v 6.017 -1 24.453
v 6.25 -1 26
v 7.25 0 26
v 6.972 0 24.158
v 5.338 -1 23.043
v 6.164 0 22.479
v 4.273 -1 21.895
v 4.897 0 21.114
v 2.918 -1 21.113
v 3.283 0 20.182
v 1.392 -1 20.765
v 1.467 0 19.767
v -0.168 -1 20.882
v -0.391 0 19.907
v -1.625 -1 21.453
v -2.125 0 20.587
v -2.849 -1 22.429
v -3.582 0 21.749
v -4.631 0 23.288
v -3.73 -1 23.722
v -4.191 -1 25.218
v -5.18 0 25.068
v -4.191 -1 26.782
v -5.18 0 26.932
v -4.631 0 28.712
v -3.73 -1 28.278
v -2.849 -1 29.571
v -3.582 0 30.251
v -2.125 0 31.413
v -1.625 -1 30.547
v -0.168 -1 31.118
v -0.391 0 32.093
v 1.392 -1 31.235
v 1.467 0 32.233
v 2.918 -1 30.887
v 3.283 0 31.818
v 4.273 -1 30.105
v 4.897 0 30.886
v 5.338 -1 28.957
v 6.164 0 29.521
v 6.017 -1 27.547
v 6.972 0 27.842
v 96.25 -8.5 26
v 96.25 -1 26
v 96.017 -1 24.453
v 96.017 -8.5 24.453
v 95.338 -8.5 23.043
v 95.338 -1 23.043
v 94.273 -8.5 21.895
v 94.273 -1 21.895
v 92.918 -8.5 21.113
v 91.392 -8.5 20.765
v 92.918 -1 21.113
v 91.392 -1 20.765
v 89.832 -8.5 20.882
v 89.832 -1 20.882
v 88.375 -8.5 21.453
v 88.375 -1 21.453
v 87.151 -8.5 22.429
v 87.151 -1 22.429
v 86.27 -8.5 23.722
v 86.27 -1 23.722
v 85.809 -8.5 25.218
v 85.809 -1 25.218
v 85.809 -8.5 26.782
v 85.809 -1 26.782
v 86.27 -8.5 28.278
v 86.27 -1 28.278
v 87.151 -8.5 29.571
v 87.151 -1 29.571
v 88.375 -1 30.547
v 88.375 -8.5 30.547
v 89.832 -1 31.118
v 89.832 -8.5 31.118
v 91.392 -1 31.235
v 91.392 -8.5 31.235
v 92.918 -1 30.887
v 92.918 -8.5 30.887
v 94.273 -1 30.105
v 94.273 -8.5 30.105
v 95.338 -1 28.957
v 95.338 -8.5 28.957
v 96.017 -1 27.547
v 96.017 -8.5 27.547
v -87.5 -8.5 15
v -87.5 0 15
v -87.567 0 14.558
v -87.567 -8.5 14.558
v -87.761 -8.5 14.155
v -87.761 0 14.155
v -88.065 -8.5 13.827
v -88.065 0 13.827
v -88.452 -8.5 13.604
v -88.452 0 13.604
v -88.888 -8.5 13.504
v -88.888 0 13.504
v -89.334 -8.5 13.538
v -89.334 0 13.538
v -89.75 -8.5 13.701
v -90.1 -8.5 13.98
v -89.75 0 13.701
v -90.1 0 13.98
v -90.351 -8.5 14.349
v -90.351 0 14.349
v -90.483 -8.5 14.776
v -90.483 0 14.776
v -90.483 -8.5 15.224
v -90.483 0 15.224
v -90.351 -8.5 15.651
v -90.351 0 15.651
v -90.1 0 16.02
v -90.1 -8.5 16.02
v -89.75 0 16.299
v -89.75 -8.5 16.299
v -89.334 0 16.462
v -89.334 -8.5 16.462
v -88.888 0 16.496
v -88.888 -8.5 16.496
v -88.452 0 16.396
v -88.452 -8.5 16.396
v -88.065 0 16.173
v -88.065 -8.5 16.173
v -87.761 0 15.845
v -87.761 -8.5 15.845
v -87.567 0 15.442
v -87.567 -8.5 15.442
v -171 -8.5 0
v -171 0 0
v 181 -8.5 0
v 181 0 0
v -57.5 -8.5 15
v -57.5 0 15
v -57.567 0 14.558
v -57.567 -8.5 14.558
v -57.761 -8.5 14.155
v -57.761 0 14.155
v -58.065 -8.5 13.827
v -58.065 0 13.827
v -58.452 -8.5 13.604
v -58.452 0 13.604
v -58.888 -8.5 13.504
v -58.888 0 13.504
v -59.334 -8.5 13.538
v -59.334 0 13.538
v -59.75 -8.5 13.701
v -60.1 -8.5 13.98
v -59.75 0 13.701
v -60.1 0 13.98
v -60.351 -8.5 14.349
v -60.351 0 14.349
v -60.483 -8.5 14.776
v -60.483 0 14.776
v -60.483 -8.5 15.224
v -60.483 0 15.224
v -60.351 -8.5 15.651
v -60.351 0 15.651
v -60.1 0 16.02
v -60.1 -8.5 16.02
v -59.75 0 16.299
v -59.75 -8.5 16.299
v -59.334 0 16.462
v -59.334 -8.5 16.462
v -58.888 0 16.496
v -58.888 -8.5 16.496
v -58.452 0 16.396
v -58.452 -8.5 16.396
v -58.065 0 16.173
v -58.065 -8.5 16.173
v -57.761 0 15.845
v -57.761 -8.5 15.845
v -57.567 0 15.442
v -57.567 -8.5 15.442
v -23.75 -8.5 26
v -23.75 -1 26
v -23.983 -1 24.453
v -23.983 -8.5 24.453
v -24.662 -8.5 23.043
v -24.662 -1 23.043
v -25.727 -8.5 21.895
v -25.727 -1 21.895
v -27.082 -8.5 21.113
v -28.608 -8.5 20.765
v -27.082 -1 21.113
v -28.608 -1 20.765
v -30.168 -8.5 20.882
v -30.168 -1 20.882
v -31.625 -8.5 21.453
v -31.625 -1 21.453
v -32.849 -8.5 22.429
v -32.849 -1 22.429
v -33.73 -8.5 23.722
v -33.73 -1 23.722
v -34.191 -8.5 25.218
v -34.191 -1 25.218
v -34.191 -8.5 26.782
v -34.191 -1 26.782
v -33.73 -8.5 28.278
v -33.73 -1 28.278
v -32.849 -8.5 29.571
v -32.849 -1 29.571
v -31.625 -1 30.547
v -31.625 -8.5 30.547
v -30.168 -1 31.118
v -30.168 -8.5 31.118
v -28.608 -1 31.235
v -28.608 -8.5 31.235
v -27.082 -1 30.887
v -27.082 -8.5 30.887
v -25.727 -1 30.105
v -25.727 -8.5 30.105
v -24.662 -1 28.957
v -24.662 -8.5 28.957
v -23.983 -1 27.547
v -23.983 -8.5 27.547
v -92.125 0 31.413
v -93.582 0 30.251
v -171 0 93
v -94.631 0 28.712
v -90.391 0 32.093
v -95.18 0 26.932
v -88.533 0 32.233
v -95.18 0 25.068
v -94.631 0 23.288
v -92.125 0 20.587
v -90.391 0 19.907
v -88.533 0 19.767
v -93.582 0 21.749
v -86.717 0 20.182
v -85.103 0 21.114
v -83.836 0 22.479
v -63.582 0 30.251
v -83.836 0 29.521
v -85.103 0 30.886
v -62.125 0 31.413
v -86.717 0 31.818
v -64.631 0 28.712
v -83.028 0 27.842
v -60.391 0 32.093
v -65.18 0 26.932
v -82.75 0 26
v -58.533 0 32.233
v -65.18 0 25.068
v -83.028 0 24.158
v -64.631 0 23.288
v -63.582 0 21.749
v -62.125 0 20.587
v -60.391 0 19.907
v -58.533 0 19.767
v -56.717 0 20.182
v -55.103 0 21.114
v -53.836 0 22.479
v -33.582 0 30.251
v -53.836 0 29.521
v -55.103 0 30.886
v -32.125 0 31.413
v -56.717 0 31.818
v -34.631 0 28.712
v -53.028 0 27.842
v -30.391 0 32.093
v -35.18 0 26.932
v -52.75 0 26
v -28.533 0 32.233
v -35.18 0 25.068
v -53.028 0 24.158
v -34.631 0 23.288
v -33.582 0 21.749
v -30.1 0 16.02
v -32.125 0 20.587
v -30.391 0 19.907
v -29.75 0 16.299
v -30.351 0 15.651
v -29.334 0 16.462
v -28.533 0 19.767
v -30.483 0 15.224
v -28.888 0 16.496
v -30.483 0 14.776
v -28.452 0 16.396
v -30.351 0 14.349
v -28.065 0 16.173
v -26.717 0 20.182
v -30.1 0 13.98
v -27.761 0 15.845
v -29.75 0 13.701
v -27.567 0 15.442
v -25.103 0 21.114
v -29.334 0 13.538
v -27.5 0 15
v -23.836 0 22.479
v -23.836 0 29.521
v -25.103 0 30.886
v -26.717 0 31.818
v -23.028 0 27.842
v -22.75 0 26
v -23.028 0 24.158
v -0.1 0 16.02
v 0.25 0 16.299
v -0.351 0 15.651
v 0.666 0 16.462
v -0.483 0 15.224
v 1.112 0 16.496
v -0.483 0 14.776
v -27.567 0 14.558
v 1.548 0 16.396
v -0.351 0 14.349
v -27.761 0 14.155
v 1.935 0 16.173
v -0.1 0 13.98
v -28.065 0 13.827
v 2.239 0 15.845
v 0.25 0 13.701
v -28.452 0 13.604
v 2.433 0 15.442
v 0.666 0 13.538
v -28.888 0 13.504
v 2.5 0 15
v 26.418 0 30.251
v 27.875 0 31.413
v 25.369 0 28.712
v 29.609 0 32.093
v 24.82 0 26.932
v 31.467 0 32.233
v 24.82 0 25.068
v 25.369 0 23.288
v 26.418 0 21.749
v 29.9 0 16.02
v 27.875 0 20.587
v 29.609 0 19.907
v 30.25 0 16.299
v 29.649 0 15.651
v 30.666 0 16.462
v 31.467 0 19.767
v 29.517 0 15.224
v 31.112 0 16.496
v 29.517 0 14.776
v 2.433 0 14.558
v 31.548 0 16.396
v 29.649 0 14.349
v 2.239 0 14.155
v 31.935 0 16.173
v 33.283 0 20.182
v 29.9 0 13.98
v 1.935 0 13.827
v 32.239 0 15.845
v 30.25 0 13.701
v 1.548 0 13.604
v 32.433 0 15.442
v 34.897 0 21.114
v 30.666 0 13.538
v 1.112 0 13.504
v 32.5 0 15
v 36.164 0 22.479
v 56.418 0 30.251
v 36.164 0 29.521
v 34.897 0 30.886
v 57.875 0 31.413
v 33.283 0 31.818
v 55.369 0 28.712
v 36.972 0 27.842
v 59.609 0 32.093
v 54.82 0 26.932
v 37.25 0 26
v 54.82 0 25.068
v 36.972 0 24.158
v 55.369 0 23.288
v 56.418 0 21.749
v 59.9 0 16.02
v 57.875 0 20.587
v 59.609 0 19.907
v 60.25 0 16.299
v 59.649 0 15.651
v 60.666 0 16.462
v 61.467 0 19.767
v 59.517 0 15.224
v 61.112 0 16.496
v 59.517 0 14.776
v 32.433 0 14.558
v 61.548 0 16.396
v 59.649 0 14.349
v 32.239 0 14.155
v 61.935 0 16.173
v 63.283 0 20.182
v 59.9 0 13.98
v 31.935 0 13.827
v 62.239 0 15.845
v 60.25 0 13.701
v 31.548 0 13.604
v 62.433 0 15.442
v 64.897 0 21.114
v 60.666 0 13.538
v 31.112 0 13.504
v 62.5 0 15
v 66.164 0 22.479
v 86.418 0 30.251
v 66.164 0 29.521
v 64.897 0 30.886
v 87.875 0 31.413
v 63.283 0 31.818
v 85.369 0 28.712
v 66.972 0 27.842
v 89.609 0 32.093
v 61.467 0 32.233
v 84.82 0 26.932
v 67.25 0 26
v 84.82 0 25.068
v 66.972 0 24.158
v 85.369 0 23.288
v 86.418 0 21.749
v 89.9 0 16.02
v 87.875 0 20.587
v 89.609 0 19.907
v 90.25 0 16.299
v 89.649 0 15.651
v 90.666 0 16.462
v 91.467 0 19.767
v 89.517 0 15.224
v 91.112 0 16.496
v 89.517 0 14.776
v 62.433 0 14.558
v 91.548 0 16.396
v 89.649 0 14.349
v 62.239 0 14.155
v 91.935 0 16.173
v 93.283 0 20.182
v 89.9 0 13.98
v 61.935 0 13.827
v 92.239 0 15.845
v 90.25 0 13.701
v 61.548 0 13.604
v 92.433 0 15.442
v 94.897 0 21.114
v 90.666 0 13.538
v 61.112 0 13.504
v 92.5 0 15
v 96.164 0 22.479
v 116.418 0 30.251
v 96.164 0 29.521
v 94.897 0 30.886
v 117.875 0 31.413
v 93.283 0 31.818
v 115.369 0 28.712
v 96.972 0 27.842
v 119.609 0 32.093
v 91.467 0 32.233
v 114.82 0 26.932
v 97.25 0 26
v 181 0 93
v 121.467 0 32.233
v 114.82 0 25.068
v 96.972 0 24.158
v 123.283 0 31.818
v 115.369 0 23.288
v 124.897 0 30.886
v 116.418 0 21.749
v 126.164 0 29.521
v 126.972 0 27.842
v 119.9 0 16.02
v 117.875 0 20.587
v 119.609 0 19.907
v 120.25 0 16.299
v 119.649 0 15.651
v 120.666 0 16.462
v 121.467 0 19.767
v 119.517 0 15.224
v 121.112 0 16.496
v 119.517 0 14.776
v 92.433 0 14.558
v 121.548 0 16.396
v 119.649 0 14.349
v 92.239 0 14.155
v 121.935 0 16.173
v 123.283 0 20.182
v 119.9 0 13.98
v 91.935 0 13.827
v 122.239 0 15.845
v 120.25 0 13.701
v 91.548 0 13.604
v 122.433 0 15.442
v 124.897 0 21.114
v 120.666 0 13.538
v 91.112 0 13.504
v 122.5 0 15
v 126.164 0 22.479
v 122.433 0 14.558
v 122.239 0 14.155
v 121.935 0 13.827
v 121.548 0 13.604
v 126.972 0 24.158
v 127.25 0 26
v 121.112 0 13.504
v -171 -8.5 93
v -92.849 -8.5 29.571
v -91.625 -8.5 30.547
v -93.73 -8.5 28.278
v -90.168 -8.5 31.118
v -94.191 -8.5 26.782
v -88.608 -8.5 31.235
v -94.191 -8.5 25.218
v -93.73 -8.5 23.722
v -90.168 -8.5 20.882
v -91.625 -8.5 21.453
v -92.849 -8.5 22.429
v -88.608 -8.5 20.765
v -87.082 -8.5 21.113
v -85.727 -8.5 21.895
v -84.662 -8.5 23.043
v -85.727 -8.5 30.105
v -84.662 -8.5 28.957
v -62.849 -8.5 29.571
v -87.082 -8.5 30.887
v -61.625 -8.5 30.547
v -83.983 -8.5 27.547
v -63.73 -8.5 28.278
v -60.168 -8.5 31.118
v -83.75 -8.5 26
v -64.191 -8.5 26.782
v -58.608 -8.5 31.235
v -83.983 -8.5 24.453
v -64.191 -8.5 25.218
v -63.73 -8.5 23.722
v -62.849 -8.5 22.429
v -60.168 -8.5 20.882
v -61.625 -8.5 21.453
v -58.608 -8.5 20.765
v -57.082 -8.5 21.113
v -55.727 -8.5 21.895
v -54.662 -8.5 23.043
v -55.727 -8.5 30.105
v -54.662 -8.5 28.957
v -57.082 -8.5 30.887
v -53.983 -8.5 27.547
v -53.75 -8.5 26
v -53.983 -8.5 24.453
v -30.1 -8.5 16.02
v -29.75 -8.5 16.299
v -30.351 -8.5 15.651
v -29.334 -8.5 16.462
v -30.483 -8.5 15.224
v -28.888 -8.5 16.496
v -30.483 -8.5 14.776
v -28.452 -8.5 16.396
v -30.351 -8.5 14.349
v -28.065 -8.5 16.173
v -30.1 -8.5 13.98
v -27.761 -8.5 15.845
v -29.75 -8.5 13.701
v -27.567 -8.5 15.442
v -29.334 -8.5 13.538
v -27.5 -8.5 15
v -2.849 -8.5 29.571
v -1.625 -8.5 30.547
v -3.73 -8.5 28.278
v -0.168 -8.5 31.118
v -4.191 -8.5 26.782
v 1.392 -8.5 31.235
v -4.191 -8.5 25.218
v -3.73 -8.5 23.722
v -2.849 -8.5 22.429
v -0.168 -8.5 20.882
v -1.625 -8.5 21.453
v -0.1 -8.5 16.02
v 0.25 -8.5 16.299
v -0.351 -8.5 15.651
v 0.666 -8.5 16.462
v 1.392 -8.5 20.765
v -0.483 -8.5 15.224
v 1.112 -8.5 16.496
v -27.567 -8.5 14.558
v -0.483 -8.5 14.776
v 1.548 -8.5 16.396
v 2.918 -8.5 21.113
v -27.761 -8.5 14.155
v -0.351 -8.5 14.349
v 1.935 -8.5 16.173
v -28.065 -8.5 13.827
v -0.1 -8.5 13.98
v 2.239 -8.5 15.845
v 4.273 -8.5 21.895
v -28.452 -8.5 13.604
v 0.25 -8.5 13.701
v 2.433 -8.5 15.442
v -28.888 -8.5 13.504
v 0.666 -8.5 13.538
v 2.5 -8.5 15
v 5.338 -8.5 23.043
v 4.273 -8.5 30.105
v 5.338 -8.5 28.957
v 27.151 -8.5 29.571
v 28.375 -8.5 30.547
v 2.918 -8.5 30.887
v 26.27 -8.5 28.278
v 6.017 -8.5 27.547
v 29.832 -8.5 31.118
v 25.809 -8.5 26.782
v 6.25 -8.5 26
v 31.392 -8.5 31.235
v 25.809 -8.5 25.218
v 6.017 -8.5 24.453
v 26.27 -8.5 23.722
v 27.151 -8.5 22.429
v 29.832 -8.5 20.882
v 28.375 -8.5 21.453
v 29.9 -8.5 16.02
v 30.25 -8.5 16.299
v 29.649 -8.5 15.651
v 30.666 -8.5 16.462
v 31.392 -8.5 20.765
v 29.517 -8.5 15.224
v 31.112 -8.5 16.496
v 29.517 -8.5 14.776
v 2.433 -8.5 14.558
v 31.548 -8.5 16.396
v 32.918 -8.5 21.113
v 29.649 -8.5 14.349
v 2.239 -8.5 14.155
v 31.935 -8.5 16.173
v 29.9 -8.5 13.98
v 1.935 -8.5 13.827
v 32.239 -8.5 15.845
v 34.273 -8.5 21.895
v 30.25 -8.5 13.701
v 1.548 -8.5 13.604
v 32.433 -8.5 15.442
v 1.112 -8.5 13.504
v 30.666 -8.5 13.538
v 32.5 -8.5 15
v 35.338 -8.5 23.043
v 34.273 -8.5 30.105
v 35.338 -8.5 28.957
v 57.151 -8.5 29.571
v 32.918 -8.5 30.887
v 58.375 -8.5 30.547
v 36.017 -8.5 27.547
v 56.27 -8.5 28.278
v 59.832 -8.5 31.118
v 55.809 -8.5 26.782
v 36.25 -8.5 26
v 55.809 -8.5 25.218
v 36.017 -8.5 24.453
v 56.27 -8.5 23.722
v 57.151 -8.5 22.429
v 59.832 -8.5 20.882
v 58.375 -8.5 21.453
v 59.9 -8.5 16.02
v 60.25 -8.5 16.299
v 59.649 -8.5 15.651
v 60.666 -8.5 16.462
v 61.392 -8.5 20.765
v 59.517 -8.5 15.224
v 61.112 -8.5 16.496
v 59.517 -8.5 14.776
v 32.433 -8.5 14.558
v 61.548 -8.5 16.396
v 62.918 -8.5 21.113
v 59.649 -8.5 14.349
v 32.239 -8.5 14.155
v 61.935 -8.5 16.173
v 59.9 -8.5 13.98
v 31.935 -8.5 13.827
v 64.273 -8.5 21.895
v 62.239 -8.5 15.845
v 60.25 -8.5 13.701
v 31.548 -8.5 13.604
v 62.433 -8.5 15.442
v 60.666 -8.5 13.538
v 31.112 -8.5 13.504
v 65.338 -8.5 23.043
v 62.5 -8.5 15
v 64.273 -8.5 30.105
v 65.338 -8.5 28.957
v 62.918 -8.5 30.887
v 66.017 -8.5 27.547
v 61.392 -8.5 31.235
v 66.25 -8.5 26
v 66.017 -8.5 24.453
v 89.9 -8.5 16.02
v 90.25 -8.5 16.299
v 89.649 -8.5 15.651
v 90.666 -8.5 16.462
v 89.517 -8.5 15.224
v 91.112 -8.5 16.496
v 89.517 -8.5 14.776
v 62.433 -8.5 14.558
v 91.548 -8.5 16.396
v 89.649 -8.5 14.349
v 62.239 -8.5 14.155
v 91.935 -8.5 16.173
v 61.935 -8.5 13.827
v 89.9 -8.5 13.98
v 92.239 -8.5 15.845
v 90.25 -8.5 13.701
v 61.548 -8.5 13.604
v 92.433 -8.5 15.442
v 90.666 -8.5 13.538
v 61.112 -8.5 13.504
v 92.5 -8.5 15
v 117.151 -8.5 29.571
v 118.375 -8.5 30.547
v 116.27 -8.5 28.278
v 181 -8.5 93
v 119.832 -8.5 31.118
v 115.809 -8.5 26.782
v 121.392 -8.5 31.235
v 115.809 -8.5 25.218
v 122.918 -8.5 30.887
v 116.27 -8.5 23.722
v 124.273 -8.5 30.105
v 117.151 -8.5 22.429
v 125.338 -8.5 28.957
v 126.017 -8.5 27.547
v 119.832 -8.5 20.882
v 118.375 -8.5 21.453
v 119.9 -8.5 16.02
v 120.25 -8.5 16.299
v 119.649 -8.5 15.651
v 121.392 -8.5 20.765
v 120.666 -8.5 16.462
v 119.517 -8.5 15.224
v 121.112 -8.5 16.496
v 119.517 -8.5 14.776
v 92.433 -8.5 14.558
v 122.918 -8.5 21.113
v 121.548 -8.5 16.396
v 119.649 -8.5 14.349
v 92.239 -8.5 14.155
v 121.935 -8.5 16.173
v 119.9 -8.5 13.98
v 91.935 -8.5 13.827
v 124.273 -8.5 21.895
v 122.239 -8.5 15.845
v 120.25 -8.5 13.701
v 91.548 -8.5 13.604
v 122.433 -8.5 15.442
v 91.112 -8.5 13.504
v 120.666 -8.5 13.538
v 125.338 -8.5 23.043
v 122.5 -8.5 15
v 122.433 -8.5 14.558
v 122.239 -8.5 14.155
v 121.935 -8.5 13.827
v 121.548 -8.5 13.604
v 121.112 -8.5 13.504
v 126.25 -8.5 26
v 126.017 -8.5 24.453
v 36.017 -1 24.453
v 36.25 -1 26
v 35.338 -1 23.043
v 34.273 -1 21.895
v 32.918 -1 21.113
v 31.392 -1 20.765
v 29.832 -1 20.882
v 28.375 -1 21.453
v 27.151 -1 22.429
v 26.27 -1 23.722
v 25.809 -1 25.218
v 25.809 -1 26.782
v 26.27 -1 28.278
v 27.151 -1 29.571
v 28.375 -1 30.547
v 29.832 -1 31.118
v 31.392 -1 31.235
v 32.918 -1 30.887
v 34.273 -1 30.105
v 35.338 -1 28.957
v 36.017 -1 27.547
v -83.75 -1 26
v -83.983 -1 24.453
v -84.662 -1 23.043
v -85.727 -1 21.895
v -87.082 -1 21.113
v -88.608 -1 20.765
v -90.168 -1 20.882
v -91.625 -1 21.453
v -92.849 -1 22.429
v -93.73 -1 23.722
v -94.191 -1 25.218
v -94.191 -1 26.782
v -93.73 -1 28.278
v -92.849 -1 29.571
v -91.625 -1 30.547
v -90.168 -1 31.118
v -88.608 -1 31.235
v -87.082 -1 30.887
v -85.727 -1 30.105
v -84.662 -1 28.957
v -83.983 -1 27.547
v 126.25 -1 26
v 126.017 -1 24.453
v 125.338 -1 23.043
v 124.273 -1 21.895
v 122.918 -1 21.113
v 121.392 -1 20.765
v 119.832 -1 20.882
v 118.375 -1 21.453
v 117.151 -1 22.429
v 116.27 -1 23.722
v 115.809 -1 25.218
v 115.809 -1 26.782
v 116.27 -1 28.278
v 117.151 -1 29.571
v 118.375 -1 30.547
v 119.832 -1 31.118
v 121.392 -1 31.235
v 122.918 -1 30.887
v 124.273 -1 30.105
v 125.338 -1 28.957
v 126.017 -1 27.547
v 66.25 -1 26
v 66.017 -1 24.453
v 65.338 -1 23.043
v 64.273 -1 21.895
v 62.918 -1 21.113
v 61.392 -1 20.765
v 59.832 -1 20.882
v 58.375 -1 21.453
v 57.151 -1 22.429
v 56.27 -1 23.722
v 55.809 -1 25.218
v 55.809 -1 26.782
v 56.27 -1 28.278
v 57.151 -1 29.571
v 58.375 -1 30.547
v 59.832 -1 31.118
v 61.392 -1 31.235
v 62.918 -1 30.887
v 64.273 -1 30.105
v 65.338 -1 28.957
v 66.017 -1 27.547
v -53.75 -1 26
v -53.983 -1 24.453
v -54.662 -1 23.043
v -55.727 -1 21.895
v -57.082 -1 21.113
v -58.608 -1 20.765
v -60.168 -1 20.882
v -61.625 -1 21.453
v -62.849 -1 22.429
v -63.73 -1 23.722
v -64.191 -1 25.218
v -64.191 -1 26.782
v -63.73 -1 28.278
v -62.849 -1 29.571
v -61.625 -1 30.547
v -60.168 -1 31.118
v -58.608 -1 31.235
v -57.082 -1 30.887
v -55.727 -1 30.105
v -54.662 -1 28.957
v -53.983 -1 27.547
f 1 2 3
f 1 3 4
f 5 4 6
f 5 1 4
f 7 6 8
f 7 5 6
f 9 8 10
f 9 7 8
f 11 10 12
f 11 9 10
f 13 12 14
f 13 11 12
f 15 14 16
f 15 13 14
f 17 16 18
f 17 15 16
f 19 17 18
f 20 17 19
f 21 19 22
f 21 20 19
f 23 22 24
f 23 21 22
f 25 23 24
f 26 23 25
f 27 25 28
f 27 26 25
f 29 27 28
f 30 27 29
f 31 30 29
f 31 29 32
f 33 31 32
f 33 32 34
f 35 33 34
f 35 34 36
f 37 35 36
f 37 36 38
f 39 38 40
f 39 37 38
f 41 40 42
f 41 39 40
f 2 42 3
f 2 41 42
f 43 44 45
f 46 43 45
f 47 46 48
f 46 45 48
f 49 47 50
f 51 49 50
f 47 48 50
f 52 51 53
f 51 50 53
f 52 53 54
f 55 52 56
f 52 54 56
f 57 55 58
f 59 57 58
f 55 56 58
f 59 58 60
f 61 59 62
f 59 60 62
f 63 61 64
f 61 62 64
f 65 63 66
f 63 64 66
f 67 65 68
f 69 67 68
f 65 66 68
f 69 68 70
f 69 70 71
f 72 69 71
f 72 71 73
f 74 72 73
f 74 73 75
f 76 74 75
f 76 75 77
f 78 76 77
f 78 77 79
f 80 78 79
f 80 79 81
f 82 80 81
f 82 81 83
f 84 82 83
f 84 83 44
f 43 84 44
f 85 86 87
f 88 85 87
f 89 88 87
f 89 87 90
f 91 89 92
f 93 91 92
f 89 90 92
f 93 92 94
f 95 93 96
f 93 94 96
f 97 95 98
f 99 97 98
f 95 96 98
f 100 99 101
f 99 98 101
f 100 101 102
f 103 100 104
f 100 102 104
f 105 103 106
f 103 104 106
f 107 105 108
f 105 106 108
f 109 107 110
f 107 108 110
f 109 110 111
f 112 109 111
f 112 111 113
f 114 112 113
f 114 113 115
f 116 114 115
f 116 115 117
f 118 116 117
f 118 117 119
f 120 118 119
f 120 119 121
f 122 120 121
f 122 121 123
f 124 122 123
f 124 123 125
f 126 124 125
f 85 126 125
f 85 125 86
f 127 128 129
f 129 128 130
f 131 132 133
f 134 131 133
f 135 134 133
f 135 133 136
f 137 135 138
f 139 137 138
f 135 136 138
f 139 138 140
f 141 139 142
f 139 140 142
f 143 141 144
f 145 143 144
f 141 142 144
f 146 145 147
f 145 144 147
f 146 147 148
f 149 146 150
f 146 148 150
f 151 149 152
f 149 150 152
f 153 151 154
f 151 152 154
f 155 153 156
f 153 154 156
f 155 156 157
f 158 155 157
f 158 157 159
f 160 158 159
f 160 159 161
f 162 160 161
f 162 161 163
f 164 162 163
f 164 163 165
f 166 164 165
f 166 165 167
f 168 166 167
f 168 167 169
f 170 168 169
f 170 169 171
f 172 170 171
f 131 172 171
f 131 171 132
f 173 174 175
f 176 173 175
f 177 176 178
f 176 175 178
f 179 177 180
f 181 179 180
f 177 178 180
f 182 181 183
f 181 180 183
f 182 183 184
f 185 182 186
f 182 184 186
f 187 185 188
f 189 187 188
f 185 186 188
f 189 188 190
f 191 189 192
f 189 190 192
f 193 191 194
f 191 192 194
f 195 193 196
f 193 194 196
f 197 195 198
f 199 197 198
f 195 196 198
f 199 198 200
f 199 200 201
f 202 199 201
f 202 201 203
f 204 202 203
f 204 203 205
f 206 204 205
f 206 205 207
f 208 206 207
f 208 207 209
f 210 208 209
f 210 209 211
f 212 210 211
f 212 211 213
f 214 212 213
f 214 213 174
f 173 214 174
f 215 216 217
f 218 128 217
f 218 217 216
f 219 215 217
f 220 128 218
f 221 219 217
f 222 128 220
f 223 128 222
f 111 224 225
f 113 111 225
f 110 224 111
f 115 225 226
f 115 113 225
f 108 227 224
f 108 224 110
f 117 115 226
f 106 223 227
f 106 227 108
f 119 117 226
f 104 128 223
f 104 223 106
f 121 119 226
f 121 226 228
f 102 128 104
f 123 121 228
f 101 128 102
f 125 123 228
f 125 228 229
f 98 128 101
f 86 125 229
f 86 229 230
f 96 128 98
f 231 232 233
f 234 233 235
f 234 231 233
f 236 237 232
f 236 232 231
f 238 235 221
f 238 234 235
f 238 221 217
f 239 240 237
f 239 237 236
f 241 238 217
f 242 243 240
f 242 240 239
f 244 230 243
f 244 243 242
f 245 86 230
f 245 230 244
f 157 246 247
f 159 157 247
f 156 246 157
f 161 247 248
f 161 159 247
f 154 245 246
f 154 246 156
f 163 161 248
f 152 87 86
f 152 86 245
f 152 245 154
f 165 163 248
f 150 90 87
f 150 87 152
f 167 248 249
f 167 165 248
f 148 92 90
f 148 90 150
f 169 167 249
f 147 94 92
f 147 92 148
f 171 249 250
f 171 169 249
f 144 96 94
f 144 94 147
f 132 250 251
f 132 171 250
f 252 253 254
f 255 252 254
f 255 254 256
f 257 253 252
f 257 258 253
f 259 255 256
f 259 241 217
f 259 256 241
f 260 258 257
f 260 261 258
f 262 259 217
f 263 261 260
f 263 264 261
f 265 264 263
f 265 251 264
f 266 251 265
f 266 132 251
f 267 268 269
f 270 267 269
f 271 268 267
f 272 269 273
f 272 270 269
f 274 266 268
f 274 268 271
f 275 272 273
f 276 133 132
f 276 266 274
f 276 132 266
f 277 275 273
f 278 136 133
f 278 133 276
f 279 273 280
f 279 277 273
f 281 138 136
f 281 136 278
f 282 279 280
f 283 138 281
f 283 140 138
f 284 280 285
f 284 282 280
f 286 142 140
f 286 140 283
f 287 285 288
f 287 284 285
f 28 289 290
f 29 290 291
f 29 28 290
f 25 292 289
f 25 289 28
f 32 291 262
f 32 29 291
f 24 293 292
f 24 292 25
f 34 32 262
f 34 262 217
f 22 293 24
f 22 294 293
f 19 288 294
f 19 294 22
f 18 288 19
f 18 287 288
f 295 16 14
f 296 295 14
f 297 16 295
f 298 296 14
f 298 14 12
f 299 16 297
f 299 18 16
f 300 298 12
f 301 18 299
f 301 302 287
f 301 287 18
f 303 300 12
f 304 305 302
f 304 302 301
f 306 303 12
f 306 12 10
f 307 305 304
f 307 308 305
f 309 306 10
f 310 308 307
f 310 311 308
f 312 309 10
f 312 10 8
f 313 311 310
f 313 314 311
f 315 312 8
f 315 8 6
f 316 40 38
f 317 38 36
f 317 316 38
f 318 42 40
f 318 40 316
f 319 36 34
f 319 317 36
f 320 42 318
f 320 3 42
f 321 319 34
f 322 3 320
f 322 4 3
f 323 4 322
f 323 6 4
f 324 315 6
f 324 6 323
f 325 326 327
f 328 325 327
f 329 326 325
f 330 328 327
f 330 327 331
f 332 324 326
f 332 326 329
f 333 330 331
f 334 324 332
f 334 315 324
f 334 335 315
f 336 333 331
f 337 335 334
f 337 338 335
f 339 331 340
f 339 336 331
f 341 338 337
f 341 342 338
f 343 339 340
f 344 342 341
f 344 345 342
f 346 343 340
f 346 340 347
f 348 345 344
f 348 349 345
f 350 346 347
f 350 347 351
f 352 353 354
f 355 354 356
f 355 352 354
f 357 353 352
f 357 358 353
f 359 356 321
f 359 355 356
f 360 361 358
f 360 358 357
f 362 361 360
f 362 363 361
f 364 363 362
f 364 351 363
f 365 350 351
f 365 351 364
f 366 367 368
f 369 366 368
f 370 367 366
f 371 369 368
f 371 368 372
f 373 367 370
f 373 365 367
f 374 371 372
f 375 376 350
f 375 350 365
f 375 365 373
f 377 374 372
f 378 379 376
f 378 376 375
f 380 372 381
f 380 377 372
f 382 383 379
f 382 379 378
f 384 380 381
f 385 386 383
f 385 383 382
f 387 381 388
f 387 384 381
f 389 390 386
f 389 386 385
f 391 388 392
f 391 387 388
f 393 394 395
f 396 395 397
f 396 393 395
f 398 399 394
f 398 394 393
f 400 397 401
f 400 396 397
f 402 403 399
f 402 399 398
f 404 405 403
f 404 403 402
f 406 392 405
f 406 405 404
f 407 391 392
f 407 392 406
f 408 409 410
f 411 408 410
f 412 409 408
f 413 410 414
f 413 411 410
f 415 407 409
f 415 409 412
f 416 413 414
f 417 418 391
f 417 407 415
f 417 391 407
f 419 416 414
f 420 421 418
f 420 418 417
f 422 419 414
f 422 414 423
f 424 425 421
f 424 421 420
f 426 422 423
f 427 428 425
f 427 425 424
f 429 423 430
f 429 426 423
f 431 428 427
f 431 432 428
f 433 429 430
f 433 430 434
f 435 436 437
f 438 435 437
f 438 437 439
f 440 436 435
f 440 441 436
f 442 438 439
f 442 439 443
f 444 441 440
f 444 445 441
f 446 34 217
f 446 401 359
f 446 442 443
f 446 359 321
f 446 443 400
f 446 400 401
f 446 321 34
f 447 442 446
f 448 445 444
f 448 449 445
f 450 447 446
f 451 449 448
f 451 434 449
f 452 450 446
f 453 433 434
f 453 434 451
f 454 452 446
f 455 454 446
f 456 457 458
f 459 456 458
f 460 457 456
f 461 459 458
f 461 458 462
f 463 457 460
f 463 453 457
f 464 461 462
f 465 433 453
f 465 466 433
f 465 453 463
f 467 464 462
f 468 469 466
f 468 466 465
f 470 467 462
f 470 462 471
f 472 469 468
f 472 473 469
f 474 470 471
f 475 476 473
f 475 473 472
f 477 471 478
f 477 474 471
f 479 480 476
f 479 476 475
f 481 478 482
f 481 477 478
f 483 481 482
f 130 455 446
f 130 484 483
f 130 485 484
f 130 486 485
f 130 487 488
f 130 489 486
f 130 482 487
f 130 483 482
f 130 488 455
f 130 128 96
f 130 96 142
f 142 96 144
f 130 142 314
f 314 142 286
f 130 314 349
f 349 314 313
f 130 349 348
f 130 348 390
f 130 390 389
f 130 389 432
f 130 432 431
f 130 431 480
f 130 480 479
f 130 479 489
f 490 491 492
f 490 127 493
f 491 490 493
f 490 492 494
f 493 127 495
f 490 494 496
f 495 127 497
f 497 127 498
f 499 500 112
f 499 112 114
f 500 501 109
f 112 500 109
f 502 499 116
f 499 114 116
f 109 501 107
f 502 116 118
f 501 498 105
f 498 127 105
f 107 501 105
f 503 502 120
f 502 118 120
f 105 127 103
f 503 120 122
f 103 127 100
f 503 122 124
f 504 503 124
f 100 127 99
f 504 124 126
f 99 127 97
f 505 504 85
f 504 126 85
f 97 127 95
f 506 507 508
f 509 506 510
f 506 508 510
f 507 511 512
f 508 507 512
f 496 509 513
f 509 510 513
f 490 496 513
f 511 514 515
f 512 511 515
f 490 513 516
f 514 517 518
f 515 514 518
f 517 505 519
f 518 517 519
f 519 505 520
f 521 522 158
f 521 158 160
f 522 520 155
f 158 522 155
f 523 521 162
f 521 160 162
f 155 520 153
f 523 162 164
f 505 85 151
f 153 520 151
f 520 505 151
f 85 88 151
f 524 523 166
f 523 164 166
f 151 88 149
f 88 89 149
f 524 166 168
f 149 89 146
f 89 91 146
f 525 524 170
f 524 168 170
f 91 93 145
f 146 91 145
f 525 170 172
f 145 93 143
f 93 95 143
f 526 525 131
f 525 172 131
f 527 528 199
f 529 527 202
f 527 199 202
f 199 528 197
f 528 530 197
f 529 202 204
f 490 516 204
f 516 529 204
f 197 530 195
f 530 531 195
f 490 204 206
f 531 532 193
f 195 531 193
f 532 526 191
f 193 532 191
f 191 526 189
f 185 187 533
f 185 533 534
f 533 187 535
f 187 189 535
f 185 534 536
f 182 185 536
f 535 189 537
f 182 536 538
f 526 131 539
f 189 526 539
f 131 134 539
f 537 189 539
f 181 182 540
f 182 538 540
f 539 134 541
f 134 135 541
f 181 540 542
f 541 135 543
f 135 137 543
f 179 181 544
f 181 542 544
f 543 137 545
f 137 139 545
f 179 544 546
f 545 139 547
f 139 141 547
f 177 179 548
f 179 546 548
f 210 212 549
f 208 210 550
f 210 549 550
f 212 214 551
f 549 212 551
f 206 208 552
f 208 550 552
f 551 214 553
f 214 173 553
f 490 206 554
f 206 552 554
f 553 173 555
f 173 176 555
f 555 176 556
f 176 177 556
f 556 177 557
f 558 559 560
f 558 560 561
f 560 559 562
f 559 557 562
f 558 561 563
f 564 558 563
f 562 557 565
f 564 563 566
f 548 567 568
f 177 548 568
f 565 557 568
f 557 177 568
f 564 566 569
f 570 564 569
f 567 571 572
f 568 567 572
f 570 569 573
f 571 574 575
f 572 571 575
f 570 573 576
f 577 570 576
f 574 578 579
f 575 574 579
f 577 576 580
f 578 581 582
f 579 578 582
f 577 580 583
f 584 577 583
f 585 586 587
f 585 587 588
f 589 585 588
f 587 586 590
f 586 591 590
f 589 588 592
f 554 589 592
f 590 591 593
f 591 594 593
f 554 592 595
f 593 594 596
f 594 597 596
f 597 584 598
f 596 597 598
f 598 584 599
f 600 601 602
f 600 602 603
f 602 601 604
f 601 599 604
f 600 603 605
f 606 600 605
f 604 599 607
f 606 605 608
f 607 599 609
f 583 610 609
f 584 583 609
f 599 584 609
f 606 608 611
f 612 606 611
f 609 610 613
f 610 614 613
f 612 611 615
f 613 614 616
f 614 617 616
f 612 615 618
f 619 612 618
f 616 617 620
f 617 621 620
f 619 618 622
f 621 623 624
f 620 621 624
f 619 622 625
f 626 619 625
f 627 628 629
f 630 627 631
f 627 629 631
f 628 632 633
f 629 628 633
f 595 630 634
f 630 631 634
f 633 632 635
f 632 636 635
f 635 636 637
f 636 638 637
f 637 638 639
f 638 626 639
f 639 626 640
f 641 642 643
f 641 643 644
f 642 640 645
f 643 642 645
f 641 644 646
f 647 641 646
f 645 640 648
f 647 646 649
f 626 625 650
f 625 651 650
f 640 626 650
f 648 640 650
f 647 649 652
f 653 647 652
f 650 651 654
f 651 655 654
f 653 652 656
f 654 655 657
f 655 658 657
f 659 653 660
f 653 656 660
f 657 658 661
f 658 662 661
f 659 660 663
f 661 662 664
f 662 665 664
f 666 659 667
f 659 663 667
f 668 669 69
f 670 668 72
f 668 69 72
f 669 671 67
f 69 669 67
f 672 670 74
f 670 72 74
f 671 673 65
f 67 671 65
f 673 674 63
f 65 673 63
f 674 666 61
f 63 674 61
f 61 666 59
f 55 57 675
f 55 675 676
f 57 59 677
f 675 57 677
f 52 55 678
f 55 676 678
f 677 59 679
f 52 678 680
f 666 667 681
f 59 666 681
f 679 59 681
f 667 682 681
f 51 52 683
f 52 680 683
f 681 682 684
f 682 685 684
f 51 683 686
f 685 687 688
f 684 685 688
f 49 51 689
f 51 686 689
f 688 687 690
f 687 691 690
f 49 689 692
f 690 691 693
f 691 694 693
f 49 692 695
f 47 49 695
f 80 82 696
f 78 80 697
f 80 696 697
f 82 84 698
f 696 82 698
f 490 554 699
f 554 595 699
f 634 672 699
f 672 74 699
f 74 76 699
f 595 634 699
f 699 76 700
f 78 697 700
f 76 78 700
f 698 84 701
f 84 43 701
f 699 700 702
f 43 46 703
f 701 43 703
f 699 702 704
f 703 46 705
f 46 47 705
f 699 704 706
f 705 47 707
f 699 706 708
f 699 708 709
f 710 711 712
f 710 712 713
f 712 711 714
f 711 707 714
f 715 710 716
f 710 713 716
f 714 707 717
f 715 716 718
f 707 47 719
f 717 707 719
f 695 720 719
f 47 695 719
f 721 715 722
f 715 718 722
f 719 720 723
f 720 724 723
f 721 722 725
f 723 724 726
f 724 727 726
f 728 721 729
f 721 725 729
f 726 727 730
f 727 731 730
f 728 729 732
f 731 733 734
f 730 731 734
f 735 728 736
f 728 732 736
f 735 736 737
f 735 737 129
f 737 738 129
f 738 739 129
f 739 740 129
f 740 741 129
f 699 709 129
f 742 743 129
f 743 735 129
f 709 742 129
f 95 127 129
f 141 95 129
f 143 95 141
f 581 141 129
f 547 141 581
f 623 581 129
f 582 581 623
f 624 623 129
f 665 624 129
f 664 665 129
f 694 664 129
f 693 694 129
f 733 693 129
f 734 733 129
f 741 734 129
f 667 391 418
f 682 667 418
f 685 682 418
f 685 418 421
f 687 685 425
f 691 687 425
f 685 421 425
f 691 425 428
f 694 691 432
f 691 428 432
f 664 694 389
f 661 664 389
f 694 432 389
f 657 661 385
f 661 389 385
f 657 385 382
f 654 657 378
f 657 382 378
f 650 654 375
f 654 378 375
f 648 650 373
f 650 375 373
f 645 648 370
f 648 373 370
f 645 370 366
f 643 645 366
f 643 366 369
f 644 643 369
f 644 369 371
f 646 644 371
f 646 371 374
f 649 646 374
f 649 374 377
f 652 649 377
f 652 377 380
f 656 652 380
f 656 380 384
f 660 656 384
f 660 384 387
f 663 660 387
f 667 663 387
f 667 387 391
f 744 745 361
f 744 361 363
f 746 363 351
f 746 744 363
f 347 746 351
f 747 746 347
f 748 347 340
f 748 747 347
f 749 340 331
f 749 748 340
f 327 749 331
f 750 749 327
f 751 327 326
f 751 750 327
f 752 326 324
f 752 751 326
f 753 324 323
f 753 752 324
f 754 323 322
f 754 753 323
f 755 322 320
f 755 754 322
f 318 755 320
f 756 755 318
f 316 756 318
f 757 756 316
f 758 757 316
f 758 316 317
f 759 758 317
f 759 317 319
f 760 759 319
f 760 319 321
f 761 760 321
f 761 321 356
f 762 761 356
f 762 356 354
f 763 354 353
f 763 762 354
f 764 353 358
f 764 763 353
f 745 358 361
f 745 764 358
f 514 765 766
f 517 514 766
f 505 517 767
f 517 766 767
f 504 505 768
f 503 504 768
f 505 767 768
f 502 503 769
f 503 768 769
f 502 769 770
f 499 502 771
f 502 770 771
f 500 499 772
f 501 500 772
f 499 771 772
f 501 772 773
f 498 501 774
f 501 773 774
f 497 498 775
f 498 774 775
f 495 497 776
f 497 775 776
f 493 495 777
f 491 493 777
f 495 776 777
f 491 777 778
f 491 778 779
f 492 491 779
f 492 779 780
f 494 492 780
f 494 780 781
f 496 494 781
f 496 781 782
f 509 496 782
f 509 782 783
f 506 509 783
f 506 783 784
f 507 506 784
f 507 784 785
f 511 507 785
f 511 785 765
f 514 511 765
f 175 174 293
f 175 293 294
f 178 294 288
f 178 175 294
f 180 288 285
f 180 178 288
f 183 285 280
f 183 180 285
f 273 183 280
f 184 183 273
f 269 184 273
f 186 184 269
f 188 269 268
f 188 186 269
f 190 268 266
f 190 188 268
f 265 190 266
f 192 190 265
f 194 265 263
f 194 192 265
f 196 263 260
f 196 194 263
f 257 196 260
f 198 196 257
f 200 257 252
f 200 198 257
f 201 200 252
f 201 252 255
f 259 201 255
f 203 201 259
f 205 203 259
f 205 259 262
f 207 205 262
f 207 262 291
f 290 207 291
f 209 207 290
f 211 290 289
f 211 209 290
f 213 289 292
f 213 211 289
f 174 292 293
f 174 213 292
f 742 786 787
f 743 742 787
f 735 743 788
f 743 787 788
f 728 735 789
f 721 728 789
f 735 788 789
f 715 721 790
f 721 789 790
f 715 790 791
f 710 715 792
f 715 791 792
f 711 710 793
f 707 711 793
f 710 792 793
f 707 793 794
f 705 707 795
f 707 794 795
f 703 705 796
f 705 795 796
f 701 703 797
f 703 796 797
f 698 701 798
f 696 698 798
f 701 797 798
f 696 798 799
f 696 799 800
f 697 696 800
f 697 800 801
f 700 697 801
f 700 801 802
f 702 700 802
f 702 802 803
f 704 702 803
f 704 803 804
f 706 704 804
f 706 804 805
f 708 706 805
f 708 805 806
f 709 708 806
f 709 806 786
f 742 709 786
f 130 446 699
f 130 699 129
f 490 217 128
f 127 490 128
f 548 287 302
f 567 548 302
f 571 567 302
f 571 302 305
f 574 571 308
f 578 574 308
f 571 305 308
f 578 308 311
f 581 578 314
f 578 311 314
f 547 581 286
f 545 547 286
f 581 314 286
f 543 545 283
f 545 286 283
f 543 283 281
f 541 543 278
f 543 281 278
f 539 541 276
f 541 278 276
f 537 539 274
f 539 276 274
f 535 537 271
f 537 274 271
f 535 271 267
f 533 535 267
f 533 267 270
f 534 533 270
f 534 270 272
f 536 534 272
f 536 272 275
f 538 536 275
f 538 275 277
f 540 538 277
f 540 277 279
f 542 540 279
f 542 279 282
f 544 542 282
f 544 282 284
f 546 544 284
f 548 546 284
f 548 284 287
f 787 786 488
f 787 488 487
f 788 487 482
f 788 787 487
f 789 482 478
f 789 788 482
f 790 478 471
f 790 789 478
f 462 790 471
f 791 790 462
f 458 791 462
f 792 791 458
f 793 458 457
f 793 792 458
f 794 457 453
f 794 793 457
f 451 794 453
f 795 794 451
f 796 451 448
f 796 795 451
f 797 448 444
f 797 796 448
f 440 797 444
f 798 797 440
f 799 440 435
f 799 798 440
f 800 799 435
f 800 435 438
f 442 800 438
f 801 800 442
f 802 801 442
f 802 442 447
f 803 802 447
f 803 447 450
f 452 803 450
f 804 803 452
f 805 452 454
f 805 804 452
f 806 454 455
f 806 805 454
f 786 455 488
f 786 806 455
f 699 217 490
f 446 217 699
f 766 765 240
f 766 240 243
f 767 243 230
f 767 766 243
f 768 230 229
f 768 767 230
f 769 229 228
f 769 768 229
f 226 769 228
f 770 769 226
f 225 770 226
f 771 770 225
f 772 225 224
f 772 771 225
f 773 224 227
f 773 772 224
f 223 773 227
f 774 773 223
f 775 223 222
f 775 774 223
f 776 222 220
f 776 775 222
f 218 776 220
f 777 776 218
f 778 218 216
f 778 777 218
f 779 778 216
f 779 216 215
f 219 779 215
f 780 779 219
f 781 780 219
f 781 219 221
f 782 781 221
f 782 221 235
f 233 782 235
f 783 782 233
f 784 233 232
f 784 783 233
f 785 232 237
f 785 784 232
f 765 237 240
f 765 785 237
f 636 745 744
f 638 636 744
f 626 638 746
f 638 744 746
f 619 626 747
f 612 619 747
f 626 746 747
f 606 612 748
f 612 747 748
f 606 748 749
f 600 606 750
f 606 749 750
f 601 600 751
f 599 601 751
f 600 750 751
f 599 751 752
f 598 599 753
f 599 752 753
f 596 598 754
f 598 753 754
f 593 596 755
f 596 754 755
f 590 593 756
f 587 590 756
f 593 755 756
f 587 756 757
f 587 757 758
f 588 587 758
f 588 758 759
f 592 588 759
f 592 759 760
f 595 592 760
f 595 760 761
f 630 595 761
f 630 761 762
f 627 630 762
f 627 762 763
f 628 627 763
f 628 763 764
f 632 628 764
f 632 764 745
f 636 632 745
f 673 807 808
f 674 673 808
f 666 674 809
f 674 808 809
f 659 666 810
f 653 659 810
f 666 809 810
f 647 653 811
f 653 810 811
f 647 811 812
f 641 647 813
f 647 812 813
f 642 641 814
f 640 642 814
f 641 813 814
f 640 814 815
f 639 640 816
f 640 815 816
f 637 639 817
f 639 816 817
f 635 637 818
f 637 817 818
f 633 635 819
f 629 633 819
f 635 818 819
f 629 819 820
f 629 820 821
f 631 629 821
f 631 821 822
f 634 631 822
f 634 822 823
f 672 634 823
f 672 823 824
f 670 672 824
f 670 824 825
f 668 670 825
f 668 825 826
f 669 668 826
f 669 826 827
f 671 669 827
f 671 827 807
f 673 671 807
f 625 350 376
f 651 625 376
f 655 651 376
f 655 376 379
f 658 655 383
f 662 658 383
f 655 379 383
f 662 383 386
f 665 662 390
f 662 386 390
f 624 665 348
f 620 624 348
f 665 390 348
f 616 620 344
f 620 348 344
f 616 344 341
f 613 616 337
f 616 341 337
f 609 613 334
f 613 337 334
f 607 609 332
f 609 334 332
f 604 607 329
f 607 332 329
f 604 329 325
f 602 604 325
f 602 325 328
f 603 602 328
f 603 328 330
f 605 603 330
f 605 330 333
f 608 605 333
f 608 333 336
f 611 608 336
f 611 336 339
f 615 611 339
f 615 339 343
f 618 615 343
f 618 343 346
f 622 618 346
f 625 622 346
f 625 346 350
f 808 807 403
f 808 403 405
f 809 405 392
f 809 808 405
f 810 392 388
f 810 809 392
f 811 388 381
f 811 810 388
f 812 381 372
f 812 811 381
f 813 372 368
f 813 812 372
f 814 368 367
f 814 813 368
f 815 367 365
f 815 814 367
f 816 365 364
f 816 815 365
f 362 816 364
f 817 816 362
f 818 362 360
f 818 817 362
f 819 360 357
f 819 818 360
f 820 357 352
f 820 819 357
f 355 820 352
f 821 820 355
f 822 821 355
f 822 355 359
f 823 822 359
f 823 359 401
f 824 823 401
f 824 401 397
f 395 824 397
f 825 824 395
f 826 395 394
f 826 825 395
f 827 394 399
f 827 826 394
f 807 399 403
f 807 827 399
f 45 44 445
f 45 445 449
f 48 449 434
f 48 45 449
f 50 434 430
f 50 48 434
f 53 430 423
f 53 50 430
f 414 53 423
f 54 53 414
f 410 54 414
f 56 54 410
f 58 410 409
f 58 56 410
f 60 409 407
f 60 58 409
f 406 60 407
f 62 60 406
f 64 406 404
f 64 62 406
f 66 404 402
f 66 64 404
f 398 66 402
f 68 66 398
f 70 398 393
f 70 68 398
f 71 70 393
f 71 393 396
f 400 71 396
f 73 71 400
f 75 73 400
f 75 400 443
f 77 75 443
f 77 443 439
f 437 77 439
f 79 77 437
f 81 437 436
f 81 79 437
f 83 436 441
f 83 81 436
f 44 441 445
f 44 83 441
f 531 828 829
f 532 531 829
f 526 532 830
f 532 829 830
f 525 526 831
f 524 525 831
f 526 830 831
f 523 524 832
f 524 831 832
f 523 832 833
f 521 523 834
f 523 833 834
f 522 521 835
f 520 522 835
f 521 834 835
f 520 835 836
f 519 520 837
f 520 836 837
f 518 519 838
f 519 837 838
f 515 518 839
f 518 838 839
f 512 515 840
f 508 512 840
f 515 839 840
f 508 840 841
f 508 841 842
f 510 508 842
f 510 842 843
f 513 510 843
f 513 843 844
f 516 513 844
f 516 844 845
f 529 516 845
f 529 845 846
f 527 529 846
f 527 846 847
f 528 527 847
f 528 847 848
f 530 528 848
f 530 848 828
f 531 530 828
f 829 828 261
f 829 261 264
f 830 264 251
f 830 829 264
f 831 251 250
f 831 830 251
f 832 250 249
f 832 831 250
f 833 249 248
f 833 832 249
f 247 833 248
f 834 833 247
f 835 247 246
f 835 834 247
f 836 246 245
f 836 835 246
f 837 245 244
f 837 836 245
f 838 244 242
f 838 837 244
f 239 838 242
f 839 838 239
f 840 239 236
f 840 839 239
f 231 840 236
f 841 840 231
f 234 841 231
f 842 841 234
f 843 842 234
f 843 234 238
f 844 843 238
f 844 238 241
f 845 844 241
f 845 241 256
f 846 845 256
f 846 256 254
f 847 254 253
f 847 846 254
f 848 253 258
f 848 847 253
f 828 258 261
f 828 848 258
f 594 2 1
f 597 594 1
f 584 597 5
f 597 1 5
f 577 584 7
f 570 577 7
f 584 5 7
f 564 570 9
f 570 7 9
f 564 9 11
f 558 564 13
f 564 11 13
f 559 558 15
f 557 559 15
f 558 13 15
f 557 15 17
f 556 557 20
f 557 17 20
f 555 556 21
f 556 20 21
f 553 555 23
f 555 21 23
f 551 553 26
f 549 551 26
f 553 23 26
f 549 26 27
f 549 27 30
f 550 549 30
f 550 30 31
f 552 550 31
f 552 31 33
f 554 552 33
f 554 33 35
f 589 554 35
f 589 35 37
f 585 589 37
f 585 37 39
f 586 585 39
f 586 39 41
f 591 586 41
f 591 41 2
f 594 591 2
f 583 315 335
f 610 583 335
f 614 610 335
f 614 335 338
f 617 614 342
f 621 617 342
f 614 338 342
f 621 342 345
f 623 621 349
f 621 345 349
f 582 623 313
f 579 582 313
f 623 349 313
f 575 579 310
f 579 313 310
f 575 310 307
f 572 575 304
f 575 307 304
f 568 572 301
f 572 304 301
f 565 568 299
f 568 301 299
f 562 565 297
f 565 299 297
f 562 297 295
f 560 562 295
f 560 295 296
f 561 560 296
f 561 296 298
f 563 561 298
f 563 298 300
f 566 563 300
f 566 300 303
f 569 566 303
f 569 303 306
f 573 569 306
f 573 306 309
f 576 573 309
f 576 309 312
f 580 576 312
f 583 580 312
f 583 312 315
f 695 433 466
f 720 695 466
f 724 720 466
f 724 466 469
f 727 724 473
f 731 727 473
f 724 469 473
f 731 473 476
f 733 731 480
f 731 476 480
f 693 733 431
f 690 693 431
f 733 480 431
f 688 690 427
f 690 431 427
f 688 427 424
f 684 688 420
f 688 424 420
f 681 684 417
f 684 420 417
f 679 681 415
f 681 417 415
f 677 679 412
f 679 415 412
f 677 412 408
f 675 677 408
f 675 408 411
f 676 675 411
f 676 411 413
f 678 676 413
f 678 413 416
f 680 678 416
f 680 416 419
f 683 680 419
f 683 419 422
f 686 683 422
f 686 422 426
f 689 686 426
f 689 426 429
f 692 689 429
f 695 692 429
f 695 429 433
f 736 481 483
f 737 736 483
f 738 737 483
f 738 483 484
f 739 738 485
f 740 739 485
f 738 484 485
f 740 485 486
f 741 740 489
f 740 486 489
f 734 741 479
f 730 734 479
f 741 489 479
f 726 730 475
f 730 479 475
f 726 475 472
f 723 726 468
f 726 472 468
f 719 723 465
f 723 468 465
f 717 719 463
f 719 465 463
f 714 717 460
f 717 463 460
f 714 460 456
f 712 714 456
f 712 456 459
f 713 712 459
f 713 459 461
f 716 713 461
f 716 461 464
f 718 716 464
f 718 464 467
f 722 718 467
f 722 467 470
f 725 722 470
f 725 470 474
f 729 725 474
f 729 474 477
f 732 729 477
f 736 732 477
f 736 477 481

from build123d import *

# Parameters (mm, degrees)
ESQUISSE5_W             = 352
ESQUISSE5_H             = 93
BOSS_EXTRU_2_DEPTH      = 8.5
ESQUISSE3_R             = 1.5
ESQUISSE3_R_2           = 5.25
ENL_V_MAT_EXTRU_1_DEPTH = 9.5
CHANFREIN1_SIZE         = 1


with BuildPart() as part:
    # Esquisse5 → Boss.-Extru.2 (new body)
    with BuildSketch(Plane(origin=(0, 0, 0), x_dir=(1, 0, 0), z_dir=(0, 1, 0))):
        with Locations((5, -46.5)):
            Rectangle(ESQUISSE5_W, ESQUISSE5_H)
    extrude(amount=-BOSS_EXTRU_2_DEPTH)

    # Esquisse3 → Enlèv. mat.-Extru.1 (cut, through all)
    with BuildSketch(Plane(origin=(0, 0, 0), x_dir=(1, 0, 0), z_dir=(0, 1, 0))):
        with Locations((-89, -15)):
            Circle(ESQUISSE3_R)
        with Locations((-89, -26)):
            Circle(ESQUISSE3_R_2)
        with Locations((-59, -15)):
            Circle(ESQUISSE3_R)
        with Locations((-59, -26)):
            Circle(ESQUISSE3_R_2)
        with Locations((-29, -15)):
            Circle(ESQUISSE3_R)
        with Locations((-29, -26)):
            Circle(ESQUISSE3_R_2)
        with Locations((1, -15)):
            Circle(ESQUISSE3_R)
        with Locations((1, -26)):
            Circle(ESQUISSE3_R_2)
        with Locations((31, -15)):
            Circle(ESQUISSE3_R)
        with Locations((31, -26)):
            Circle(ESQUISSE3_R_2)
        with Locations((61, -15)):
            Circle(ESQUISSE3_R)
        with Locations((61, -26)):
            Circle(ESQUISSE3_R_2)
        with Locations((91, -15)):
            Circle(ESQUISSE3_R)
        with Locations((91, -26)):
            Circle(ESQUISSE3_R_2)
        with Locations((121, -15)):
            Circle(ESQUISSE3_R)
        with Locations((121, -26)):
            Circle(ESQUISSE3_R_2)
    extrude(amount=-ENL_V_MAT_EXTRU_1_DEPTH, mode=Mode.SUBTRACT)

    # Chanfrein1
    chanfrein1_edges = [part.edges().sort_by_distance(p)[0] for p in [
        (-34.25, 0, 26),
        (-4.25, 0, 26),
        (-94.25, 0, 26),
        (-64.25, 0, 26),
        (85.75, 0, 26),
        (115.75, 0, 26),
        (25.75, 0, 26),
        (55.75, 0, 26),
    ]]
    chamfer(chanfrein1_edges, length=CHANFREIN1_SIZE)


solid = part.part
